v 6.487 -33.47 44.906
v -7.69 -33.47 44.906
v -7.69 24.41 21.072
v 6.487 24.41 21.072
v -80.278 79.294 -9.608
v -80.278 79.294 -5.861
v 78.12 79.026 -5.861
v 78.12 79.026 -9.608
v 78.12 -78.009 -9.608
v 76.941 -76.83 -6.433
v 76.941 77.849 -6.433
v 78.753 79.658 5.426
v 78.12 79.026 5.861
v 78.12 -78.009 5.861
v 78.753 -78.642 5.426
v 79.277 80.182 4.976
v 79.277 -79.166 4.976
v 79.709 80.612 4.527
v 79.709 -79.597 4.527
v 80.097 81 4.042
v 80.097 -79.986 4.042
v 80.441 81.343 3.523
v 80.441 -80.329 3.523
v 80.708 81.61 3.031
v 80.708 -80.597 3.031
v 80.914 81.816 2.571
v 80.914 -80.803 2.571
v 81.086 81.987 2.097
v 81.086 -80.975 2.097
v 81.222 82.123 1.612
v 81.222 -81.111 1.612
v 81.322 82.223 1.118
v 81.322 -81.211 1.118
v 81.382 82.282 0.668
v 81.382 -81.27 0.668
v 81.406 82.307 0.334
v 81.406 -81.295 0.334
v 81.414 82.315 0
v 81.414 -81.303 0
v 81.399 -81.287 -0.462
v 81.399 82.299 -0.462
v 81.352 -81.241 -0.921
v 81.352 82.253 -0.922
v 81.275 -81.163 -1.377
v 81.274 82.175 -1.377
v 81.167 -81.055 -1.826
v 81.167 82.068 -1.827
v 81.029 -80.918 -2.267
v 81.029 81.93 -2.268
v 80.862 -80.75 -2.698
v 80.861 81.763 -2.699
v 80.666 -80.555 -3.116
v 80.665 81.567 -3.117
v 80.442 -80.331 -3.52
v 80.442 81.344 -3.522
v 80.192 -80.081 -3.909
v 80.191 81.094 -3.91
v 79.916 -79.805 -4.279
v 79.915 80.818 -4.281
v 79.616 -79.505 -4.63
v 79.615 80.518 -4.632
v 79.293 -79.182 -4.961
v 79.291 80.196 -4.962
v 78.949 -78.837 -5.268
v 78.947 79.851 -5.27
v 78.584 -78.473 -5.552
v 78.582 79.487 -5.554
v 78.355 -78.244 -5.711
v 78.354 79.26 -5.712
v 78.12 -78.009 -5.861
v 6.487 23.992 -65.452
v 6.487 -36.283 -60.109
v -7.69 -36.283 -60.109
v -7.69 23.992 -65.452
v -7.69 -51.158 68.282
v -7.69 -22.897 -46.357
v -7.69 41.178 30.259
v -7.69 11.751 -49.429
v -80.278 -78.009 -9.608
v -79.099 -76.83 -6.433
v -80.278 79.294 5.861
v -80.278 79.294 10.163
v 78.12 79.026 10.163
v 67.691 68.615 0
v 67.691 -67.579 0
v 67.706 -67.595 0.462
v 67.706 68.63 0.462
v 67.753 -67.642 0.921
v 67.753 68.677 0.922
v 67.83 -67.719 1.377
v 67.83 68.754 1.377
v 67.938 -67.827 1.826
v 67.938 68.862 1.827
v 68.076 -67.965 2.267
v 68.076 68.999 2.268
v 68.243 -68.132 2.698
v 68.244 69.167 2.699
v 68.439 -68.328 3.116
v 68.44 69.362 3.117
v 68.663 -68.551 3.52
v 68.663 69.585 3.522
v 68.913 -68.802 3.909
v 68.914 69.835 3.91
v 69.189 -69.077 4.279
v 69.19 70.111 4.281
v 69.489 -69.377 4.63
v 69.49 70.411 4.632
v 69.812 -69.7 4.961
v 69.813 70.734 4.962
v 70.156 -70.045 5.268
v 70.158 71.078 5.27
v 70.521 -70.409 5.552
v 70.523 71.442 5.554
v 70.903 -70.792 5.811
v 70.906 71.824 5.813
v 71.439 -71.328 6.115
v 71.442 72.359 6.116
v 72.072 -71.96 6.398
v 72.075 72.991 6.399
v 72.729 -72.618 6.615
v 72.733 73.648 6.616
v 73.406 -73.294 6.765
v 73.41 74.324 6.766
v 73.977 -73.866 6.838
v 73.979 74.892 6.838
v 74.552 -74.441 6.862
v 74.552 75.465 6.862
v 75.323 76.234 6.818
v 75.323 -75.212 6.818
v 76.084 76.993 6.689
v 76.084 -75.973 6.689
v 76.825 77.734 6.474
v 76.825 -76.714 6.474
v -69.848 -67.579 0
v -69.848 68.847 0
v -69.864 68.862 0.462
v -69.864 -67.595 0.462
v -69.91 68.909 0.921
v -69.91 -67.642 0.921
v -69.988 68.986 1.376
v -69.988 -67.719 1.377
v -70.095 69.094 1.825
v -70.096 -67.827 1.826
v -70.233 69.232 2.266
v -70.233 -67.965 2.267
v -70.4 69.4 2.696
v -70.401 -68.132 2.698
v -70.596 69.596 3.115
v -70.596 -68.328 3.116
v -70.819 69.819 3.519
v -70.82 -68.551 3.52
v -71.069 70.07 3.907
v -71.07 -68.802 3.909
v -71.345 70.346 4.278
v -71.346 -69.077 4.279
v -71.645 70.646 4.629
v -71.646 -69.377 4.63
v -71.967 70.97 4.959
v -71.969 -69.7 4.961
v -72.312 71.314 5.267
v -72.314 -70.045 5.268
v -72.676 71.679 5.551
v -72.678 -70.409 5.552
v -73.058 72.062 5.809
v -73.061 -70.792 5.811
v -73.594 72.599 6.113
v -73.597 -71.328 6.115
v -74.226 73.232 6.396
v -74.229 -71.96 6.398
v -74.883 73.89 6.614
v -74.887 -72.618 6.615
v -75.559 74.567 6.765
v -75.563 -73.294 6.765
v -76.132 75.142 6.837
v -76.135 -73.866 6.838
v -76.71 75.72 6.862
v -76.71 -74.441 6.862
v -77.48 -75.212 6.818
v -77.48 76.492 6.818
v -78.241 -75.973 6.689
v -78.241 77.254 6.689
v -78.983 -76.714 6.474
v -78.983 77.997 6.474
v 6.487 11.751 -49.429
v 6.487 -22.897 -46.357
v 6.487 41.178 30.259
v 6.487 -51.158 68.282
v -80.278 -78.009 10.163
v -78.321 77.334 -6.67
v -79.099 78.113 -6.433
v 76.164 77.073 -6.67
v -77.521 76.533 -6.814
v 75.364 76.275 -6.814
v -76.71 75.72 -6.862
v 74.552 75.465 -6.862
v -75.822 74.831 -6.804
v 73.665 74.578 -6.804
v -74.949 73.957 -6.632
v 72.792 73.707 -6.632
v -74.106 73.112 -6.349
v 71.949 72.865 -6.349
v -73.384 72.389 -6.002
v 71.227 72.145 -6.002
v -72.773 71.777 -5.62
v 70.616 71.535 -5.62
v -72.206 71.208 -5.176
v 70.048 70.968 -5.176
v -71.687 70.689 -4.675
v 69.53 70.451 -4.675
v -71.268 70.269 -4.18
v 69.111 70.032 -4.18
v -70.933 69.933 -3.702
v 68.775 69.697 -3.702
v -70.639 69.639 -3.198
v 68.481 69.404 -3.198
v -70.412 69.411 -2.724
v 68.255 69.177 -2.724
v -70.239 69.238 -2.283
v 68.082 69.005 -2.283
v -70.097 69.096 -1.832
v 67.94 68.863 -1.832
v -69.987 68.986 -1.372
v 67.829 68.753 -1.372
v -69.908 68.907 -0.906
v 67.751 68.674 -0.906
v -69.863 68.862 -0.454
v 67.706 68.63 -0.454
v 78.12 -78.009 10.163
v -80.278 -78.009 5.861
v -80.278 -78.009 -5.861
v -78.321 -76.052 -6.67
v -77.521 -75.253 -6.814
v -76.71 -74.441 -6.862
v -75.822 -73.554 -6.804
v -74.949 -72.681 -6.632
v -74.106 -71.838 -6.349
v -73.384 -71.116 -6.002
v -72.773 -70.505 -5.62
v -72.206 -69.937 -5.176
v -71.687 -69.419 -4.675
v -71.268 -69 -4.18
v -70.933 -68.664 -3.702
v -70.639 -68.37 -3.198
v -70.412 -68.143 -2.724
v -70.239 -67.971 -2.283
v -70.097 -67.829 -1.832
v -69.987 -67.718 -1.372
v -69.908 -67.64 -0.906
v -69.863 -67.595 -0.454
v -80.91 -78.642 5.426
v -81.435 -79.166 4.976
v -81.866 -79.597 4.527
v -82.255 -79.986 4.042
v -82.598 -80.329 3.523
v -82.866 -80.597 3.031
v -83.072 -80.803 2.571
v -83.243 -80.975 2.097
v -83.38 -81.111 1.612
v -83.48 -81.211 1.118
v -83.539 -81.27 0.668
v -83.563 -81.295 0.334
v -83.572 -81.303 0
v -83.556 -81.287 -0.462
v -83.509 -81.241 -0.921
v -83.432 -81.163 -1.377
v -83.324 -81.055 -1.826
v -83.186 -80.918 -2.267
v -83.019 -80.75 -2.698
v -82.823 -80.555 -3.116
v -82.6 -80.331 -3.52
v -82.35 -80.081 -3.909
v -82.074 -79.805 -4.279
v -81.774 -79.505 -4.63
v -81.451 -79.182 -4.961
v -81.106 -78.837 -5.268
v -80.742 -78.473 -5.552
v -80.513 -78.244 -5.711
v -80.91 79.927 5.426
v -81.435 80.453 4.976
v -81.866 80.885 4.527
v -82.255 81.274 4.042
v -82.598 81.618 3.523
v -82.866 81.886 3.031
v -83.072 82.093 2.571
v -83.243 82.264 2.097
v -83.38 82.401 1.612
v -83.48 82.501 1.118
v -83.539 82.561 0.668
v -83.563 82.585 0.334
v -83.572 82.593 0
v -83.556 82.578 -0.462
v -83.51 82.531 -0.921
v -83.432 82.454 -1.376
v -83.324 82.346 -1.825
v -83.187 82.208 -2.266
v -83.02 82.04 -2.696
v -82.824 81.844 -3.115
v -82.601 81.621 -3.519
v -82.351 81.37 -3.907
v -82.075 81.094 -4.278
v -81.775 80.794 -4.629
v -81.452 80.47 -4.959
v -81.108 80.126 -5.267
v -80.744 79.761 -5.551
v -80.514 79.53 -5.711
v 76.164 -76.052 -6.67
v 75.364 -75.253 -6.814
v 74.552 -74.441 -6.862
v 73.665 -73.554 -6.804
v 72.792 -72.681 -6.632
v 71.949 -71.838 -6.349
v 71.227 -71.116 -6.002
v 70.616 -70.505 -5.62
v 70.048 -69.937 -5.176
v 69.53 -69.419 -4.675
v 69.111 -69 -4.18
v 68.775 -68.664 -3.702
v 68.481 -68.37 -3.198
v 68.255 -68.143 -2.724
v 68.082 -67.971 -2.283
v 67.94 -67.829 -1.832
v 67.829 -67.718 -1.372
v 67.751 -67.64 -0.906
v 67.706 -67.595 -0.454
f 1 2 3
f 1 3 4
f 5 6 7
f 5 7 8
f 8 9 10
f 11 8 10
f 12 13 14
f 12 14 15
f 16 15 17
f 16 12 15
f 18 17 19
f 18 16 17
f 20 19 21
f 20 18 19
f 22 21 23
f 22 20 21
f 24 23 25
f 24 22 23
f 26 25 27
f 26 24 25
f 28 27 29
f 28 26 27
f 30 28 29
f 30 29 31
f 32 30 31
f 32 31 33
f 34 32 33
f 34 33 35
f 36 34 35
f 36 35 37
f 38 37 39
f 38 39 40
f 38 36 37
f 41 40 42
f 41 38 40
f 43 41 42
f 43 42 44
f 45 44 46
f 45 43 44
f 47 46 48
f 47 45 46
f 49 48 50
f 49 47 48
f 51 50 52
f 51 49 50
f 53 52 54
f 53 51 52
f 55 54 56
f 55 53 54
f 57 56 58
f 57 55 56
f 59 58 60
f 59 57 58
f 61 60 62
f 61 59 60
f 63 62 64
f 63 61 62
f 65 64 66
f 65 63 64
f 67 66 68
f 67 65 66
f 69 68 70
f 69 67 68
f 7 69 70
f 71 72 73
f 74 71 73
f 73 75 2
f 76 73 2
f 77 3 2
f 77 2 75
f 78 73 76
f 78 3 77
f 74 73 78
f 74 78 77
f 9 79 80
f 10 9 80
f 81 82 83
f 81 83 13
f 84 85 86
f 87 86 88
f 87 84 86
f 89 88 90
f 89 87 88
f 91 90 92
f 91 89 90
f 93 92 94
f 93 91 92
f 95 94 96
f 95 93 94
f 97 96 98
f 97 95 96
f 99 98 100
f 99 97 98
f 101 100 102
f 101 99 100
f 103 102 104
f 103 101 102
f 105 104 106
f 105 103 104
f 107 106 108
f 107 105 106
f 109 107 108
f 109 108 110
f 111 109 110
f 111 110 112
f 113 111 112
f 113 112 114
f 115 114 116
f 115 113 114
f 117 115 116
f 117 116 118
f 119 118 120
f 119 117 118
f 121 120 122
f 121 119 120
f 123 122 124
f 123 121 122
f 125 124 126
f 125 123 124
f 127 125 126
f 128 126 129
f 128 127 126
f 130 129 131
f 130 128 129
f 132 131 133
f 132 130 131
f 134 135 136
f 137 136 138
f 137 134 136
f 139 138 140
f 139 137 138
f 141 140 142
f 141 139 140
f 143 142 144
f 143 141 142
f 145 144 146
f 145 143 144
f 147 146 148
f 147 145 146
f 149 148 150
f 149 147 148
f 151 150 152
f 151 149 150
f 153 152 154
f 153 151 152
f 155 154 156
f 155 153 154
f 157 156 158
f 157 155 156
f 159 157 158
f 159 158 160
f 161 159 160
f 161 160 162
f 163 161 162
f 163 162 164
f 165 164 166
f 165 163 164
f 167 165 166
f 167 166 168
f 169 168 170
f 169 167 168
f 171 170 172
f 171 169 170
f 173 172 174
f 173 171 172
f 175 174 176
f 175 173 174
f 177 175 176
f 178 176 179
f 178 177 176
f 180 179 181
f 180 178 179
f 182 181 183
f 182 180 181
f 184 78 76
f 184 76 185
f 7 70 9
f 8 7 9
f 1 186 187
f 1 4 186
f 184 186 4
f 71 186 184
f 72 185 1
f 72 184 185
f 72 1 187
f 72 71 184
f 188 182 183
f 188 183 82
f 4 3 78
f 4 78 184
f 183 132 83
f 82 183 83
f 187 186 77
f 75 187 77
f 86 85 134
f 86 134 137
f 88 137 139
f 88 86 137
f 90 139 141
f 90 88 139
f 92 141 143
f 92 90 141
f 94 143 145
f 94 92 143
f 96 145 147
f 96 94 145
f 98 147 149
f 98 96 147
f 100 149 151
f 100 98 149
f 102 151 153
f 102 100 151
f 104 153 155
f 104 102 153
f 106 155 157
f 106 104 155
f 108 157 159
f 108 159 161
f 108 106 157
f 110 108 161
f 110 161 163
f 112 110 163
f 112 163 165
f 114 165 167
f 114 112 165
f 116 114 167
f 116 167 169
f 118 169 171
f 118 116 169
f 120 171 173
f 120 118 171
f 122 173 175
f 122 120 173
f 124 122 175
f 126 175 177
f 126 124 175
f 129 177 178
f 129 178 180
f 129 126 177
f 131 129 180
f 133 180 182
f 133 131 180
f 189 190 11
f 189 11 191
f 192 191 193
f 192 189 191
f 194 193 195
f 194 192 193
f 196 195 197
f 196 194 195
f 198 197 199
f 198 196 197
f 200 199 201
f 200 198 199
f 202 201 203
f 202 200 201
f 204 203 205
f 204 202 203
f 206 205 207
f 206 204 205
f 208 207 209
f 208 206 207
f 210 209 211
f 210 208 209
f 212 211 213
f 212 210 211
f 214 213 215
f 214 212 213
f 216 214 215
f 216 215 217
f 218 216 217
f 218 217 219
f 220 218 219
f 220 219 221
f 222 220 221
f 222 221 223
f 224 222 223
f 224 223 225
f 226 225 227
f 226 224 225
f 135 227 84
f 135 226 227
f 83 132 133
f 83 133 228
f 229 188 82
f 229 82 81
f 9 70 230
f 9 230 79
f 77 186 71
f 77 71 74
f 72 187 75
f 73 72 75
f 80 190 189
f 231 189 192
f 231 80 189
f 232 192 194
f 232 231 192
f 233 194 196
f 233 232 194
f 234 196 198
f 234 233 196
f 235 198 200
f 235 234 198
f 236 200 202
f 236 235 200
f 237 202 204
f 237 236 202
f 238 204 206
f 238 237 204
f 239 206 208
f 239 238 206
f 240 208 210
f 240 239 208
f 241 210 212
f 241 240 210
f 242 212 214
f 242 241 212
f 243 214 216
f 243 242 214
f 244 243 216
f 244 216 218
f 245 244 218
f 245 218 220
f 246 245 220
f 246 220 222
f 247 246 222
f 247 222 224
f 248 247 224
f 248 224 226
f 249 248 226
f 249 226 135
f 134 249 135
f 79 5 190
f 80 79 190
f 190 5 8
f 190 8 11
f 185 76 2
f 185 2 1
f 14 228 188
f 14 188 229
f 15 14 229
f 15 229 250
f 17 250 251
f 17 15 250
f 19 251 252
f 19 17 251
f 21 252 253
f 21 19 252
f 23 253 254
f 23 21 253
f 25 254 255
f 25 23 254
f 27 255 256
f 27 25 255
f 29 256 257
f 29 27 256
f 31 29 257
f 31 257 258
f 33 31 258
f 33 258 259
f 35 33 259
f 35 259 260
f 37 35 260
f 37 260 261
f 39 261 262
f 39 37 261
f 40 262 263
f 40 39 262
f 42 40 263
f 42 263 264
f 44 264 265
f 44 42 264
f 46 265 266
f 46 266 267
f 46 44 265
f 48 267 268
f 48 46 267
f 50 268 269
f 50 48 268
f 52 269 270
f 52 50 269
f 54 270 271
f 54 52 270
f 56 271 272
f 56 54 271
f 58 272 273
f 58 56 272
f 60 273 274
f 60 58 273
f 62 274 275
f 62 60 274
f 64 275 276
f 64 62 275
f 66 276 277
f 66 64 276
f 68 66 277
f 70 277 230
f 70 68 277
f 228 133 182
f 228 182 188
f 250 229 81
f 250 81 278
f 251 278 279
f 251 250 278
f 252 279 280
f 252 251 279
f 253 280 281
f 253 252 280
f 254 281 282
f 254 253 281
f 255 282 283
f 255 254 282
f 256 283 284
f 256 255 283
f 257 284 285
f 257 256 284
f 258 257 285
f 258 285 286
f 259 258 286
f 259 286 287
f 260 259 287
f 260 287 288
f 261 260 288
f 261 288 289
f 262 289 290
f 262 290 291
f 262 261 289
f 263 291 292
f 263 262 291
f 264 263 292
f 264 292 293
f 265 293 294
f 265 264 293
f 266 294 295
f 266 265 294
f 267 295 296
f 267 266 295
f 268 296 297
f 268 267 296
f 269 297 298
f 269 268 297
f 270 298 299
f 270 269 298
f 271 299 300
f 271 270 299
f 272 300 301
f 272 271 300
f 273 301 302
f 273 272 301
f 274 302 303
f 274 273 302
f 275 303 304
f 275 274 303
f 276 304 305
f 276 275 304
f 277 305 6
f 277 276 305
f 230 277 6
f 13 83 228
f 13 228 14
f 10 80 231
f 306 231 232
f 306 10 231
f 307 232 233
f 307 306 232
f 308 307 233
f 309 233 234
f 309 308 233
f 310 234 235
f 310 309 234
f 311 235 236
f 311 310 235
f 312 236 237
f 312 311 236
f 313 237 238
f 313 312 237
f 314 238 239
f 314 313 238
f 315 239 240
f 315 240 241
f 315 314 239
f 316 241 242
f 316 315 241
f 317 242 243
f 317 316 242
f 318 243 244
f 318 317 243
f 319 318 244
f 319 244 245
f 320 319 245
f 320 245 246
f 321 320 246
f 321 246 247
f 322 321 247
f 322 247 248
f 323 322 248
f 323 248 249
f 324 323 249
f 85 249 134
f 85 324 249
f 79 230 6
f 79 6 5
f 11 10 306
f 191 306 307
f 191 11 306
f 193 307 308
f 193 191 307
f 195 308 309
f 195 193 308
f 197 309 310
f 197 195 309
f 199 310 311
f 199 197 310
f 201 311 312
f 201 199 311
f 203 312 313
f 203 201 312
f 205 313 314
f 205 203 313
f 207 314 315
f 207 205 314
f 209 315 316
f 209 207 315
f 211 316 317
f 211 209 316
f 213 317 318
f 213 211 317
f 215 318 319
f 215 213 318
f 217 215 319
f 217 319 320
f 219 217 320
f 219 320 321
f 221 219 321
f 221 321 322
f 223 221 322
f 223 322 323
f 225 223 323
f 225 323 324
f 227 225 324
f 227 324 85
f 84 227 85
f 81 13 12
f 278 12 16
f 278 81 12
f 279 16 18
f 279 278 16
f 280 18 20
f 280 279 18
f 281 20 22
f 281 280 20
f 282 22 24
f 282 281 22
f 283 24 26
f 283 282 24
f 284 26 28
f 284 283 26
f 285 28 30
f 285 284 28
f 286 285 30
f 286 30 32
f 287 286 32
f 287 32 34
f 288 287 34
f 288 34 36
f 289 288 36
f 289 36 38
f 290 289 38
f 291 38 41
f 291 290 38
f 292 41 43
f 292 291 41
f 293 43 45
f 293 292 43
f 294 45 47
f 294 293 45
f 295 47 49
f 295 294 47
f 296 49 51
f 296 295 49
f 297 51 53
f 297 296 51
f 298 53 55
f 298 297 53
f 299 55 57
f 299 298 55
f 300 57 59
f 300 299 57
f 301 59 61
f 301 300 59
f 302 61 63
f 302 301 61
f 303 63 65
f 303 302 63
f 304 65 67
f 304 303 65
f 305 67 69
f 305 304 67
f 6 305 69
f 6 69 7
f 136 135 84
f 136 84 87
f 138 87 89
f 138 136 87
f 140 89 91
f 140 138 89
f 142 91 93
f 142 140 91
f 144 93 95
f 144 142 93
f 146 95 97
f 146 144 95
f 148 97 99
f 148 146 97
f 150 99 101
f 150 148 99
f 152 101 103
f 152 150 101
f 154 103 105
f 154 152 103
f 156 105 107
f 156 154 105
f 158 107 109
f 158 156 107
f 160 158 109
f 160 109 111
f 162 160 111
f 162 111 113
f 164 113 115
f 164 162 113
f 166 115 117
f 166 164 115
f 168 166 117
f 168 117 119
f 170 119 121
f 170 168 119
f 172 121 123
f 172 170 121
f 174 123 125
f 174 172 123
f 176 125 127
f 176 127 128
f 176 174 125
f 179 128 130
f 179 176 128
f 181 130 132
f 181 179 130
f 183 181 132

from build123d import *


with BuildPart() as f2:
    # F2: sweep along a path in F0
    with BuildLine(Plane.XY) as f2_path:
        Line((-76.9190266728, 75.929440558), (-76.9190266728, -74.6503025293))
        Line((-76.9190266728, -74.6503025293), (74.7615620494, -74.6503025293))
        Line((74.7615620494, -74.6503025293), (74.7615620494, 75.6734088063))
        Line((74.7615620494, 75.6734088063), (-76.9190266728, 75.929440558))
    # F1 (on Front) → F2 (sweep)
    with BuildSketch(Plane.XZ):
        with BuildLine():
            ThreePointArc((-79.0985139787, -6.4325190471), (-72.7924455804, -5.6335047029), (-69.8482058942, 0))
            ThreePointArc((-69.8482058942, 0), (-72.7420669571, 5.5981359113), (-78.9827263138, 6.4743369876))
            Line((-78.9827263138, 6.4743369876), (-76.7098963261, 0))
            Line((-76.7098963261, 0), (-79.0985139787, -6.4325190471))
        make_face()
        with BuildLine():
            Line((-76.7098963261, 0), (-78.9827263138, 6.4743369876))
            ThreePointArc((-78.9827263138, 6.4743369876), (-79.6462392347, 6.2016679938), (-80.277658999, 5.8612170317))
            Line((-80.277658999, 5.8612170317), (-80.277658999, -5.8612170317))
            ThreePointArc((-80.277658999, -5.8612170317), (-79.7017541342, -6.1750775249), (-79.0985139787, -6.4325190471))
            Line((-79.0985139787, -6.4325190471), (-76.7098963261, 0))
        make_face()
        with BuildLine():
            ThreePointArc((-80.277658999, 5.8612170317), (-79.6462392347, 6.2016679938), (-78.9827263138, 6.4743369876))
            Line((-78.9827263138, 6.4743369876), (-80.277658999, 10.1630557328))
            Line((-80.277658999, 10.1630557328), (-80.277658999, 5.8612170317))
        make_face()
        with BuildLine():
            Line((-80.277658999, -9.6079426205), (-79.0985139787, -6.4325190471))
            ThreePointArc((-79.0985139787, -6.4325190471), (-79.7017541342, -6.1750775249), (-80.277658999, -5.8612170317))
            Line((-80.277658999, -5.8612170317), (-80.277658999, -9.6079426205))
        make_face()
        with BuildLine():
            Line((-80.277658999, -5.8612170317), (-80.277658999, 5.8612170317))
            ThreePointArc((-80.277658999, 5.8612170317), (-83.5715867579, 0), (-80.277658999, -5.8612170317))
        make_face()
    sweep(path=f2_path.line, transition=Transition.RIGHT)


with BuildPart() as f5:
    # F5: sweep along a path in F3
    with BuildLine(Plane.YZ) as f5_path:
        Line((-43.4850491583, 58.1423304975), (-30.476687476, -54.1441440582))
        Line((-30.476687476, -54.1441440582), (18.6822358519, -58.5017614067))
        Line((18.6822358519, -58.5017614067), (33.9041054249, 26.2740924954))
        Line((33.9041054249, 26.2740924954), (-43.4850491583, 58.1423304975))
    # F4 (on Top) → F5 (sweep)
    with BuildSketch(Plane.XY):
        Polygon((-7.6896613464, 35.7444100082), (-7.6896613464, 29.3526444584), (-7.6896613464, 20.6260532141), (6.487286184, 20.6260532141), (6.487286184, 35.7444100082), align=None)
    sweep(path=f5_path.line, transition=Transition.RIGHT)


solid = Compound([f2.part, f5.part])
